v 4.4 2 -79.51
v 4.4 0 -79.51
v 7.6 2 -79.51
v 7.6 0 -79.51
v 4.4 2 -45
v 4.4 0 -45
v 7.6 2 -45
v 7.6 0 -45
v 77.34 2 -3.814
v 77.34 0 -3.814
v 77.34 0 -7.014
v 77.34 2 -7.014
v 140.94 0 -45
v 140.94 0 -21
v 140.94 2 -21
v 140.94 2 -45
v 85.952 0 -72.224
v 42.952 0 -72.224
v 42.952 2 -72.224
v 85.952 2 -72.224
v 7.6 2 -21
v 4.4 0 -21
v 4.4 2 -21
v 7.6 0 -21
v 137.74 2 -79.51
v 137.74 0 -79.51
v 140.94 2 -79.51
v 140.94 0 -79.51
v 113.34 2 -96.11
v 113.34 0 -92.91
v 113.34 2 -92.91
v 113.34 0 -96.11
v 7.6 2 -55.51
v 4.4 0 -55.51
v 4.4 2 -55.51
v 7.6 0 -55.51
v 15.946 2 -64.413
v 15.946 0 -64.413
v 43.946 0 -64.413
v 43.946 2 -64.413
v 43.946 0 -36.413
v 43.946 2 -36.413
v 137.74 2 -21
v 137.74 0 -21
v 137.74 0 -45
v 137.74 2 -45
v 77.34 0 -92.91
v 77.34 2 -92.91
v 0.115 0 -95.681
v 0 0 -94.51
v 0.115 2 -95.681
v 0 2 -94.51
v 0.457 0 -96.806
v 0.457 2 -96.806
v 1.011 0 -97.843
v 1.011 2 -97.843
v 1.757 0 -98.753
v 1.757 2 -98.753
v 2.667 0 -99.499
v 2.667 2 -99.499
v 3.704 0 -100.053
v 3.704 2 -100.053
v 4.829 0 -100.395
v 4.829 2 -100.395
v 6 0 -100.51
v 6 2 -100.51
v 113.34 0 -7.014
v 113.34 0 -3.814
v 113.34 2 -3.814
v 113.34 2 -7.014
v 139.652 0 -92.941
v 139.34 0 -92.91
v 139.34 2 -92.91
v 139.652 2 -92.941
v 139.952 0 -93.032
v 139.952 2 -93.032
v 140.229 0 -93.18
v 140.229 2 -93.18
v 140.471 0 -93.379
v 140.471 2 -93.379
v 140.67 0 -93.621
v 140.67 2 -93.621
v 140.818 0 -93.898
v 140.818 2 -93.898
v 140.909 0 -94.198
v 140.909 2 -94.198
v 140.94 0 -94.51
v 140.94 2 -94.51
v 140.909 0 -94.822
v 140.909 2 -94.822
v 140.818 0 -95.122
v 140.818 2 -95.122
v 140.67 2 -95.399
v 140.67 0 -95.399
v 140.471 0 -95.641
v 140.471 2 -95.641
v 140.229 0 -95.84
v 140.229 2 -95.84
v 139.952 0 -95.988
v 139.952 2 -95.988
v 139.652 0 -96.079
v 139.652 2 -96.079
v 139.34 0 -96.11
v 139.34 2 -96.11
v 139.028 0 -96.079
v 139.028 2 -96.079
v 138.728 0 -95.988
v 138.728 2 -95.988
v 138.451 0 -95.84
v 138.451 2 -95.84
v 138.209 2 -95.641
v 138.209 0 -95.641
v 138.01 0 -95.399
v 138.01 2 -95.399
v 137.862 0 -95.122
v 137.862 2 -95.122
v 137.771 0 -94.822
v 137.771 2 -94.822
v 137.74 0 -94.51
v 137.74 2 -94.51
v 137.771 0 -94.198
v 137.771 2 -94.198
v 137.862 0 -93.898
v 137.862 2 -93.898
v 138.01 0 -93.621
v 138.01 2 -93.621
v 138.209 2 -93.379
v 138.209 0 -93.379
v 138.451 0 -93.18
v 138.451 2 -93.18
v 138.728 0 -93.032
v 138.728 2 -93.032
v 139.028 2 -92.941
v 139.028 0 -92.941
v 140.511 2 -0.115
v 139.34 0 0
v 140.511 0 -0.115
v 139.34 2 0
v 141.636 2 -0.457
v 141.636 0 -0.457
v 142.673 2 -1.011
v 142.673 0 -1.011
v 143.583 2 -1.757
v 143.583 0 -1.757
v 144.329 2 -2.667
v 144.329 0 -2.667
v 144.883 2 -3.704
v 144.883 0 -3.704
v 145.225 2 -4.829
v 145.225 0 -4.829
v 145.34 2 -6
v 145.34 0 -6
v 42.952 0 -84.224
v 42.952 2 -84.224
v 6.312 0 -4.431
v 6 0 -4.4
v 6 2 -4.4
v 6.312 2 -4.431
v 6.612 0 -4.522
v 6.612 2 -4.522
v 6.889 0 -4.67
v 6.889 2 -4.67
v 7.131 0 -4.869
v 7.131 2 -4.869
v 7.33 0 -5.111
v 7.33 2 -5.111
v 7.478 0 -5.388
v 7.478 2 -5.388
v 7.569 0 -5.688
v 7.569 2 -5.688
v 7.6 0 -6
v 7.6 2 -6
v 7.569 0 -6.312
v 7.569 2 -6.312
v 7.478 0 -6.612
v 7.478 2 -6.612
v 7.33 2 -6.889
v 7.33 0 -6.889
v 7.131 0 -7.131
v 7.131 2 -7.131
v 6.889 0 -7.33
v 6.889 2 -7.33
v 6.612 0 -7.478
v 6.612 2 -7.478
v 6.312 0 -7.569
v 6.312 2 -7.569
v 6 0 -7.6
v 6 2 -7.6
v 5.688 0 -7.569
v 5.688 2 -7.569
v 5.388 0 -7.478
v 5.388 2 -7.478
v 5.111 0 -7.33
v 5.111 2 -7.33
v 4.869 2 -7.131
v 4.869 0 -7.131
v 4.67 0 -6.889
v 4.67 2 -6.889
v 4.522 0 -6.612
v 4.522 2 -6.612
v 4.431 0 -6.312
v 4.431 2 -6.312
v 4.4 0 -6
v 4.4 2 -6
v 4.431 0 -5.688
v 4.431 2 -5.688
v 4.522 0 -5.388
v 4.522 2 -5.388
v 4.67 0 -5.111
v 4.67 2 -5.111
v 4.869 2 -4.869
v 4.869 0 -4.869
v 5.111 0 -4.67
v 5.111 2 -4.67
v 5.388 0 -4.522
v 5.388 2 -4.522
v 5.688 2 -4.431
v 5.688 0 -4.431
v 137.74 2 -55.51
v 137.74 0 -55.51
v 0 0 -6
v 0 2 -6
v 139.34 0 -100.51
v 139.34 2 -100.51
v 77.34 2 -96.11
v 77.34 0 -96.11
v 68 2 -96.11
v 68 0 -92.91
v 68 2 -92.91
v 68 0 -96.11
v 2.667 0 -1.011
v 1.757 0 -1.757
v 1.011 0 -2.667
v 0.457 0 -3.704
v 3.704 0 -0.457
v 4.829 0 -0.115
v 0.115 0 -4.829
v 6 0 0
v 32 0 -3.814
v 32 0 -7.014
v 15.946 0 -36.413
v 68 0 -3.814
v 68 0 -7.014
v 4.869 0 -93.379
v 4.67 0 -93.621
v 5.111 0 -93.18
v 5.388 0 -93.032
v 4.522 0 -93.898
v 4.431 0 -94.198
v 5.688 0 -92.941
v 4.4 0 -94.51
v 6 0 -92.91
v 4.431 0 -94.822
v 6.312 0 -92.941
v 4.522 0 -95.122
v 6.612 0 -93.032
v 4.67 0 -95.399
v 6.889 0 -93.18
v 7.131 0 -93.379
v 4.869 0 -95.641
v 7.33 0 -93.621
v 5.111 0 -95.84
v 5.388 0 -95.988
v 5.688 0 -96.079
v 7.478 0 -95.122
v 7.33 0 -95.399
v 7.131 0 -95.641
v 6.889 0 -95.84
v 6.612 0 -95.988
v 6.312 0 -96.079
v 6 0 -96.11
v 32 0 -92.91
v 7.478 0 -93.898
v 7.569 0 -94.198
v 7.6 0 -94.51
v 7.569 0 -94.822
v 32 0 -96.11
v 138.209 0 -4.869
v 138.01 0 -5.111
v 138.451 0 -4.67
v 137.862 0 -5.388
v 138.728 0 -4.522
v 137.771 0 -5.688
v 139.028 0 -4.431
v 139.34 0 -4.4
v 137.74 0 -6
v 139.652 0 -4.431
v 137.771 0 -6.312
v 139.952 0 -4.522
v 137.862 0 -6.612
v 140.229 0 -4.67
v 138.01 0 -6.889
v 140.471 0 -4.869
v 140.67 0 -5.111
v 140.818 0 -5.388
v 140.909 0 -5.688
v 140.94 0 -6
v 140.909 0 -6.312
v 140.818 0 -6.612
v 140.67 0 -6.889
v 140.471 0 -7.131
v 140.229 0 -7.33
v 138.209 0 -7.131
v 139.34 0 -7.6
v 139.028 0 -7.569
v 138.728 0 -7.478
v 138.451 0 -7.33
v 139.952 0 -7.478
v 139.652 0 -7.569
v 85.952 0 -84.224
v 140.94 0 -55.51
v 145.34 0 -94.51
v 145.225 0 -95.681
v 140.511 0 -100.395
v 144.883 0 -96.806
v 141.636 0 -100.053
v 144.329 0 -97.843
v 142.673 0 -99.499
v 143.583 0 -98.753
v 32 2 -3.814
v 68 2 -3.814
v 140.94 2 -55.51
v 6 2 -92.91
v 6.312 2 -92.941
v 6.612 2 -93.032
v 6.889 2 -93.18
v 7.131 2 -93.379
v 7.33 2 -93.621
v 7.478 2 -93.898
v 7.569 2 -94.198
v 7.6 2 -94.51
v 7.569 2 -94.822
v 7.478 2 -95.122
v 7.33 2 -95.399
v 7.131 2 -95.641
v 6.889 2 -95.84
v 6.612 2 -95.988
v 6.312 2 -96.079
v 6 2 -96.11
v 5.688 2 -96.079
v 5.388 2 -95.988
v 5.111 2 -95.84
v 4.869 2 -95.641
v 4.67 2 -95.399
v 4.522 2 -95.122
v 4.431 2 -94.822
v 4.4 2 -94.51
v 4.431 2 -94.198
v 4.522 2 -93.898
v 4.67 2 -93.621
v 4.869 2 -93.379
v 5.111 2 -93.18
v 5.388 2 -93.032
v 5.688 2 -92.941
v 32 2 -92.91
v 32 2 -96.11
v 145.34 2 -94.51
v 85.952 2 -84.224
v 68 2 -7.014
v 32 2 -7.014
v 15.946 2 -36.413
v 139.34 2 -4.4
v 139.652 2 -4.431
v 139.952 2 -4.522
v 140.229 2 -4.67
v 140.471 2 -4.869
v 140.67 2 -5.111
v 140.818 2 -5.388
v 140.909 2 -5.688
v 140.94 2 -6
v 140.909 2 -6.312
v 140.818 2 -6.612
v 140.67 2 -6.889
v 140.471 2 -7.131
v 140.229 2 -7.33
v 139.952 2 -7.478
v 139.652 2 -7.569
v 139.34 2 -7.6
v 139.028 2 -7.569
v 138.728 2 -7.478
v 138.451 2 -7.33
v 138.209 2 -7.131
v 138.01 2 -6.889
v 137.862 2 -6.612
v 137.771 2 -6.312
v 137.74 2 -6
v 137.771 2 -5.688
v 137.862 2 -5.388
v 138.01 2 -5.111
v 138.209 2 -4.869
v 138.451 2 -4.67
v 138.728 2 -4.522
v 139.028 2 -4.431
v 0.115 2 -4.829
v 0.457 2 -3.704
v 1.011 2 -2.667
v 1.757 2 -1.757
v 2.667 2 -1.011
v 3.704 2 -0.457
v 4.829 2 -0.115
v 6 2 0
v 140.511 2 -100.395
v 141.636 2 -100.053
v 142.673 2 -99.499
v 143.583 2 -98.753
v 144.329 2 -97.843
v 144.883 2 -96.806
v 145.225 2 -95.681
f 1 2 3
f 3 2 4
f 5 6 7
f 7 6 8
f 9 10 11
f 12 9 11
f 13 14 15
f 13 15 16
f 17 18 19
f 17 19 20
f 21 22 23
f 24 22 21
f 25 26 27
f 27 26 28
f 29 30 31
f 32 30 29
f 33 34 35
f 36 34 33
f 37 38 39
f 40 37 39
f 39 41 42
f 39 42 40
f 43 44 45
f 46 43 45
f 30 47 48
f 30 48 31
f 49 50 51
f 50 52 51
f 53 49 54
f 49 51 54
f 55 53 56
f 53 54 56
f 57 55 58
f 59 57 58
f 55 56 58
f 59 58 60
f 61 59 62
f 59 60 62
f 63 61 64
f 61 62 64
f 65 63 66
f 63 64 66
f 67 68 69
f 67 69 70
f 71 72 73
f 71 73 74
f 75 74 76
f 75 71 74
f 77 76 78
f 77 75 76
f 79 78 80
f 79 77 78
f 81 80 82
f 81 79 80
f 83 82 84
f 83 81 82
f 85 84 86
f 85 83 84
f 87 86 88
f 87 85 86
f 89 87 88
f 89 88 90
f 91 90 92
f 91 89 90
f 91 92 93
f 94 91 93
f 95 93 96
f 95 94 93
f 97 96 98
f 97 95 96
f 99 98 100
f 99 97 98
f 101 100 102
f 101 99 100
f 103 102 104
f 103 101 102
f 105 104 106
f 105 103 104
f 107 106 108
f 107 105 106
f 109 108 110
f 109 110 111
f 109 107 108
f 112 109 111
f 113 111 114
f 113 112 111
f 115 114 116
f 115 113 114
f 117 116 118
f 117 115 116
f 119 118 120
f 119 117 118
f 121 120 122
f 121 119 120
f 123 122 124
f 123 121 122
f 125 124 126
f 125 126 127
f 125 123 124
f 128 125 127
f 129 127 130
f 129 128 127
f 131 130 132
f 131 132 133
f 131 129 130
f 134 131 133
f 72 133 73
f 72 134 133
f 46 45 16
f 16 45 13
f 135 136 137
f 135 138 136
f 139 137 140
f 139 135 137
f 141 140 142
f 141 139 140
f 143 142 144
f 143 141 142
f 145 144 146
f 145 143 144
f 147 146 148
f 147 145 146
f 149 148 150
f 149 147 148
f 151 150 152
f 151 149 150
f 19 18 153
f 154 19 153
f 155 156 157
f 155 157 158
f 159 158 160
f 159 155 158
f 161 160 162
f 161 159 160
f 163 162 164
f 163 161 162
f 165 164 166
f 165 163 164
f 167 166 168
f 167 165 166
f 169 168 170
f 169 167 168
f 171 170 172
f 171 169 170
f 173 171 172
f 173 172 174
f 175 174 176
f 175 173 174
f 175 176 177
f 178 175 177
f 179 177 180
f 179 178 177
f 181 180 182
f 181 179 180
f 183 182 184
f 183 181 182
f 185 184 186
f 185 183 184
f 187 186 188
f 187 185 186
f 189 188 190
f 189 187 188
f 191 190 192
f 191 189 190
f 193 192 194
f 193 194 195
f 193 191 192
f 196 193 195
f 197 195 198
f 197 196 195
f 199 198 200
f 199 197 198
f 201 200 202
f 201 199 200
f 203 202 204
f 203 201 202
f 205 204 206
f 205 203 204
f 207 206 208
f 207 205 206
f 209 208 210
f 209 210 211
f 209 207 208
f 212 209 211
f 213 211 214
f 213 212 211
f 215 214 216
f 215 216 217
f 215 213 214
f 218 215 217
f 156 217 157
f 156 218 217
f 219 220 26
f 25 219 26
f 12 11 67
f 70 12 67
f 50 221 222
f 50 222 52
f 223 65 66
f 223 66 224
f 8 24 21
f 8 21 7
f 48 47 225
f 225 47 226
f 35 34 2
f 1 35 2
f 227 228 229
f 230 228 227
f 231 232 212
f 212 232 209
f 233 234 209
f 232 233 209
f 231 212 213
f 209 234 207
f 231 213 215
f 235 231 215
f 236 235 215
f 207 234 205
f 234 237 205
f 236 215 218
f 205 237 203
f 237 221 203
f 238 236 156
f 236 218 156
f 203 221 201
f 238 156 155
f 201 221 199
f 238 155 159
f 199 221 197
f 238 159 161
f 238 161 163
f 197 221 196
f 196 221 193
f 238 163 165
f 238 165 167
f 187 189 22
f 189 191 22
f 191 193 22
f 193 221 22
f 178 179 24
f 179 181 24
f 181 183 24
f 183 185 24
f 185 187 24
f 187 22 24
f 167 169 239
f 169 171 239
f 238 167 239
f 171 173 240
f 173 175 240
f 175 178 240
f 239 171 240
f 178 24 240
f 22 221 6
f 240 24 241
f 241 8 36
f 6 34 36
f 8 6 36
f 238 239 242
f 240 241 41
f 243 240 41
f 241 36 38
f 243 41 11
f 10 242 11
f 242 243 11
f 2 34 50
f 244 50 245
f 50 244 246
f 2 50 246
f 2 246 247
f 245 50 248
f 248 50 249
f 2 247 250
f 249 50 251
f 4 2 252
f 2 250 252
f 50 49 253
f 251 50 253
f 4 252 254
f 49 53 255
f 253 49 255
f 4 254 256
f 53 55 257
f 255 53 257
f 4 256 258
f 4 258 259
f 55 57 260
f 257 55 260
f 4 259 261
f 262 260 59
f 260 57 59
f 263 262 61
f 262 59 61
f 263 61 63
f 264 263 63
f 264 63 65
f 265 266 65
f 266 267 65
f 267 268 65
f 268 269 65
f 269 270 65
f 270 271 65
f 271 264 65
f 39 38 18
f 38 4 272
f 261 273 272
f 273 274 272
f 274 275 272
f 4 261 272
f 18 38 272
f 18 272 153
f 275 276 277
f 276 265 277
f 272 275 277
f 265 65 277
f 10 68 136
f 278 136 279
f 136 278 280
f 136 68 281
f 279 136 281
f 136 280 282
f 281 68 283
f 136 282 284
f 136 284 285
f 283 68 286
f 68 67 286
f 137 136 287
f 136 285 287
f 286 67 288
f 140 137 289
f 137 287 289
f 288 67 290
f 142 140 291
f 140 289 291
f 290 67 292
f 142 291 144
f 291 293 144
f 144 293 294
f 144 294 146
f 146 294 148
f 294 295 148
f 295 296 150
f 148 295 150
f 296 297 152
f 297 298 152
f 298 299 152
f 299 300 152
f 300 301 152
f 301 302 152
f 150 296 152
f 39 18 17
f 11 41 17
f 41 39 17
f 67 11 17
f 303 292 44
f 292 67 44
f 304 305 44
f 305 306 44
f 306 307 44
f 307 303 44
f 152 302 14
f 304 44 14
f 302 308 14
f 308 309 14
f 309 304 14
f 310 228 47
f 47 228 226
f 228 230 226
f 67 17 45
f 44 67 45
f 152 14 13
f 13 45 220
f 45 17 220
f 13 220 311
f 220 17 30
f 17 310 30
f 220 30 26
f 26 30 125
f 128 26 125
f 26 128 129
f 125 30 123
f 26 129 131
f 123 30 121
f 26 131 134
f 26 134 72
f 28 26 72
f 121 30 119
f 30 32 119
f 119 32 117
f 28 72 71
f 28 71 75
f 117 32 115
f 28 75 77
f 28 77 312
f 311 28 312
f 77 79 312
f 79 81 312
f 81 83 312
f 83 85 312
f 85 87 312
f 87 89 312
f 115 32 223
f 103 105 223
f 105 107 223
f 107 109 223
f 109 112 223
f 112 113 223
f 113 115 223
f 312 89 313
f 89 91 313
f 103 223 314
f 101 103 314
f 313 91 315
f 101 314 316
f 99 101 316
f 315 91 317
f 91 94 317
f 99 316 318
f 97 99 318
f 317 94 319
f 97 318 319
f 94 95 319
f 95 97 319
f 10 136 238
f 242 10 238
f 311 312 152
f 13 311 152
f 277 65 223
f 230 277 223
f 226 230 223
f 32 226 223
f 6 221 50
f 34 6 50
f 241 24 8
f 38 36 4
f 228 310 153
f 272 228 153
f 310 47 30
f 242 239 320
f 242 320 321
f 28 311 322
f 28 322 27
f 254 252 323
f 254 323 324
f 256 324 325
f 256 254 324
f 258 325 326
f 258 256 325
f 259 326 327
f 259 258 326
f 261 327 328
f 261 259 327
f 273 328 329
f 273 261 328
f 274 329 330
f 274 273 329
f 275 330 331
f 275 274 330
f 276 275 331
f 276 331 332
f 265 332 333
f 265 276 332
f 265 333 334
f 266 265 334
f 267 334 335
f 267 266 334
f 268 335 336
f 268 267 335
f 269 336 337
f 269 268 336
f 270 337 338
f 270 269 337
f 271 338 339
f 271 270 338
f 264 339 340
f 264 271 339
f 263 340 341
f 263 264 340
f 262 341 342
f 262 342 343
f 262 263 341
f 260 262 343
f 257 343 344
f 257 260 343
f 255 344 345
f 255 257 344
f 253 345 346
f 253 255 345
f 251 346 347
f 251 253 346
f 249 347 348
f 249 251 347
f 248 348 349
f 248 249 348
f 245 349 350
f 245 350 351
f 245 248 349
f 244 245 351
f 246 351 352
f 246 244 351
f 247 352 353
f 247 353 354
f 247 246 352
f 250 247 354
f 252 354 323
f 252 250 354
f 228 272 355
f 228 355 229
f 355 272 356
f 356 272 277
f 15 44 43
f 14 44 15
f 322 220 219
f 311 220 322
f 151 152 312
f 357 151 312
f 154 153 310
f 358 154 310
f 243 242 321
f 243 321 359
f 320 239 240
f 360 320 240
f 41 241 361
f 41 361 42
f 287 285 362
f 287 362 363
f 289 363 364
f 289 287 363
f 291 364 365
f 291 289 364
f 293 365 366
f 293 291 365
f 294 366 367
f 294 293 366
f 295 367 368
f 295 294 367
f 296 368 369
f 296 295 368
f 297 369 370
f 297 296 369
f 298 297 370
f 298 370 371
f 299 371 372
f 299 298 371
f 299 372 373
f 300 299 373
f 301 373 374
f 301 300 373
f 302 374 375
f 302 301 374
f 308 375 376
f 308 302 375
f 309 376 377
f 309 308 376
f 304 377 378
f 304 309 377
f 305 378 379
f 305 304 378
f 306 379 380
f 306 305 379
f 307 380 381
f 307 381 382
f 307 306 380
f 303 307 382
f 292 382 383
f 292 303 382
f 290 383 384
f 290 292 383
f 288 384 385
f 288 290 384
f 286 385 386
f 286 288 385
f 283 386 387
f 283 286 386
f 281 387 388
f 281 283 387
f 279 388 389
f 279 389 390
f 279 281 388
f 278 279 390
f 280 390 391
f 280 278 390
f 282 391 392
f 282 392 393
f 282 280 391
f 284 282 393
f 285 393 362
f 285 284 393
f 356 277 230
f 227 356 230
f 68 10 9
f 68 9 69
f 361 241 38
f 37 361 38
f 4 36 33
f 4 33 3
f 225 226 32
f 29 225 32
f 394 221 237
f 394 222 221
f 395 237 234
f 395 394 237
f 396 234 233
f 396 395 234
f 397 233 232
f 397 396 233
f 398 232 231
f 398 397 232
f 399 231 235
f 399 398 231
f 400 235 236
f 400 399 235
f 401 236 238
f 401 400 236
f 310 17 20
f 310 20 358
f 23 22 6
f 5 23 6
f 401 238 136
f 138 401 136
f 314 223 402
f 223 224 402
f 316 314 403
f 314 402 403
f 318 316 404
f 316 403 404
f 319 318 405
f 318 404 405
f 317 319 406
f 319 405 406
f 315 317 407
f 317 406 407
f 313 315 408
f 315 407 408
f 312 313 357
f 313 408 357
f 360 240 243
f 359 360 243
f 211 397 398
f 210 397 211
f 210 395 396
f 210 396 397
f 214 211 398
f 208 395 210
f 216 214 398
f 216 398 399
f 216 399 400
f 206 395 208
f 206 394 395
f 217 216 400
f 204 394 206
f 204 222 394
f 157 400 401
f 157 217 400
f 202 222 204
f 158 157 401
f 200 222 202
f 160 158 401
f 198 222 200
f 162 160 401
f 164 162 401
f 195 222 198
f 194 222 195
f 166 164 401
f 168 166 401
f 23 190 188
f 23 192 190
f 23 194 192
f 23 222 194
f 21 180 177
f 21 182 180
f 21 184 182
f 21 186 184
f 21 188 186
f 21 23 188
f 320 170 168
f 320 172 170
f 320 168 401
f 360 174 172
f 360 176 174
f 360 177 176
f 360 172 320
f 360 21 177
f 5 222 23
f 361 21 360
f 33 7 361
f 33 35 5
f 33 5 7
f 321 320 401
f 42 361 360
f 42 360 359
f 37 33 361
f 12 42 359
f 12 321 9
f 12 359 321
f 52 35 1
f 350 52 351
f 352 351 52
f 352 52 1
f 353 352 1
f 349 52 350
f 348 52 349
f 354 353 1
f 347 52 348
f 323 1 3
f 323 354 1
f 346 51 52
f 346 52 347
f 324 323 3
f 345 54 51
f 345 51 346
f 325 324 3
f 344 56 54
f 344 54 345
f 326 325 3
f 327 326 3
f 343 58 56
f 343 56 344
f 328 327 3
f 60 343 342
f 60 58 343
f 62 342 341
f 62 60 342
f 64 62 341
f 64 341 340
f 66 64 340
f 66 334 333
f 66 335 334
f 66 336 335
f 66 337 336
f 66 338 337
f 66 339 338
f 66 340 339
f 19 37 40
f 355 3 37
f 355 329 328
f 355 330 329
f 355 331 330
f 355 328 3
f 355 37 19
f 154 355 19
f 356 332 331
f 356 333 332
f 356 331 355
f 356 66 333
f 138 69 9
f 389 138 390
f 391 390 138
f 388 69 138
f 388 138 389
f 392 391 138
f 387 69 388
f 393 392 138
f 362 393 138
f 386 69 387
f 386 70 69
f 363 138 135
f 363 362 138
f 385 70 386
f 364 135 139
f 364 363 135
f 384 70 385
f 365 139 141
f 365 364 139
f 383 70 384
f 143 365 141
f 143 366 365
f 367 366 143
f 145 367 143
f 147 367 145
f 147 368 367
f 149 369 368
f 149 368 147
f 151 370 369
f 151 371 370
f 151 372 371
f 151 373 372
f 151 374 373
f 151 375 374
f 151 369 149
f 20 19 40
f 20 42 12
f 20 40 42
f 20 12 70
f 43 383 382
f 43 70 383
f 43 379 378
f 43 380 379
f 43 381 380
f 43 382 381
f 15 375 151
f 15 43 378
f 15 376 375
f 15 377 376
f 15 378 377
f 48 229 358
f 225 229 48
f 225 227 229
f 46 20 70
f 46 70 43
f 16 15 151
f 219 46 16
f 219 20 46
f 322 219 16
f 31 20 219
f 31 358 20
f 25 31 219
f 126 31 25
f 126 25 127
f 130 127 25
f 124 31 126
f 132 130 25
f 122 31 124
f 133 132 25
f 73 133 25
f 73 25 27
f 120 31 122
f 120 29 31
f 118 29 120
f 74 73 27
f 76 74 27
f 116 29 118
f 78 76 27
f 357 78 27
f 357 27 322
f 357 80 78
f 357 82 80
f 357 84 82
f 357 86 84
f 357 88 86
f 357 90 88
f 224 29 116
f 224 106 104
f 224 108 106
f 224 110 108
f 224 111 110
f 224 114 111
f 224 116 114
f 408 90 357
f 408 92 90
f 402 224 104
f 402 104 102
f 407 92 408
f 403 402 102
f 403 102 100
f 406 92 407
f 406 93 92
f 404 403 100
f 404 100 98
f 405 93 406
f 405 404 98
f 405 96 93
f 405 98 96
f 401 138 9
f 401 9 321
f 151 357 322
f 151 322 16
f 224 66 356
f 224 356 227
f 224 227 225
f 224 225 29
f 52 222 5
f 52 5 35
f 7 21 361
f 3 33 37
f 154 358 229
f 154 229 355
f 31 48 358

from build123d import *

# Parameters (mm, degrees)
SKETCH1_W           = 145.34
SKETCH1_H           = 100.51
SKETCH1_R           = 1.6
SKETCH1_W_2         = 36
SKETCH1_H_2         = 3.2
SKETCH1_W_3         = 3.2
SKETCH1_H_3         = 24
SKETCH1_W_4         = 28
SKETCH1_H_4         = 28
SKETCH1_W_5         = 43
SKETCH1_H_5         = 12
BOSS_EXTRUDE1_DEPTH = 2
FILLET1_R           = 6
FILLET2_R           = 6
FILLET3_R           = 6


with BuildPart() as part:
    # Sketch1 → Boss-Extrude1 (new body)
    with BuildSketch(Plane(origin=(0, 0, 0), x_dir=(1, 0, 0), z_dir=(0, 1, 0))):
        with Locations((72.67, 50.255)):
            Rectangle(SKETCH1_W, SKETCH1_H)
        with Locations(Location((6, 94.51, 0), (0, 0, 270))):
            Circle(SKETCH1_R, mode=Mode.SUBTRACT)
        with Locations(Location((139.34, 94.51, 0), (0, 0, 270))):
            Circle(SKETCH1_R, mode=Mode.SUBTRACT)
        with Locations(Location((139.34, 6, 0), (0, 0, 270))):
            Circle(SKETCH1_R, mode=Mode.SUBTRACT)
        with Locations(Location((6, 6, 0), (0, 0, 270))):
            Circle(SKETCH1_R, mode=Mode.SUBTRACT)
        with Locations((50, 5.414130674)):
            Rectangle(SKETCH1_W_2, SKETCH1_H_2, mode=Mode.SUBTRACT)
        with Locations((50, 94.51)):
            Rectangle(SKETCH1_W_2, SKETCH1_H_2, mode=Mode.SUBTRACT)
        with Locations((95.34, 94.51)):
            Rectangle(SKETCH1_W_2, SKETCH1_H_2, mode=Mode.SUBTRACT)
        with Locations((95.34, 5.414130674)):
            Rectangle(SKETCH1_W_2, SKETCH1_H_2, mode=Mode.SUBTRACT)
        with Locations((6, 67.51)):
            Rectangle(SKETCH1_W_3, SKETCH1_H_3, mode=Mode.SUBTRACT)
        with Locations((6, 33)):
            Rectangle(SKETCH1_W_3, SKETCH1_H_3, mode=Mode.SUBTRACT)
        with Locations((139.34, 67.51)):
            Rectangle(SKETCH1_W_3, SKETCH1_H_3, mode=Mode.SUBTRACT)
        with Locations((139.34, 33)):
            Rectangle(SKETCH1_W_3, SKETCH1_H_3, mode=Mode.SUBTRACT)
        with Locations((29.946, 50.413)):
            Rectangle(SKETCH1_W_4, SKETCH1_H_4, mode=Mode.SUBTRACT)
        with Locations((64.452, 78.224)):
            Rectangle(SKETCH1_W_5, SKETCH1_H_5, mode=Mode.SUBTRACT)
    extrude(amount=BOSS_EXTRUDE1_DEPTH)

    # Fillet1
    fillet1_edges = [part.edges().sort_by_distance(p)[0] for p in [
        (0, 1, -100.51),
    ]]
    fillet(fillet1_edges, radius=FILLET1_R)

    # Fillet2
    fillet2_edges = [part.edges().sort_by_distance(p)[0] for p in [
        (0, 1, 0),
    ]]
    fillet(fillet2_edges, radius=FILLET2_R)

    # Fillet3
    fillet3_edges = [part.edges().sort_by_distance(p)[0] for p in [
        (145.34, 1, -100.51),
        (145.34, 1, 0),
    ]]
    fillet(fillet3_edges, radius=FILLET3_R)


solid = part.part
